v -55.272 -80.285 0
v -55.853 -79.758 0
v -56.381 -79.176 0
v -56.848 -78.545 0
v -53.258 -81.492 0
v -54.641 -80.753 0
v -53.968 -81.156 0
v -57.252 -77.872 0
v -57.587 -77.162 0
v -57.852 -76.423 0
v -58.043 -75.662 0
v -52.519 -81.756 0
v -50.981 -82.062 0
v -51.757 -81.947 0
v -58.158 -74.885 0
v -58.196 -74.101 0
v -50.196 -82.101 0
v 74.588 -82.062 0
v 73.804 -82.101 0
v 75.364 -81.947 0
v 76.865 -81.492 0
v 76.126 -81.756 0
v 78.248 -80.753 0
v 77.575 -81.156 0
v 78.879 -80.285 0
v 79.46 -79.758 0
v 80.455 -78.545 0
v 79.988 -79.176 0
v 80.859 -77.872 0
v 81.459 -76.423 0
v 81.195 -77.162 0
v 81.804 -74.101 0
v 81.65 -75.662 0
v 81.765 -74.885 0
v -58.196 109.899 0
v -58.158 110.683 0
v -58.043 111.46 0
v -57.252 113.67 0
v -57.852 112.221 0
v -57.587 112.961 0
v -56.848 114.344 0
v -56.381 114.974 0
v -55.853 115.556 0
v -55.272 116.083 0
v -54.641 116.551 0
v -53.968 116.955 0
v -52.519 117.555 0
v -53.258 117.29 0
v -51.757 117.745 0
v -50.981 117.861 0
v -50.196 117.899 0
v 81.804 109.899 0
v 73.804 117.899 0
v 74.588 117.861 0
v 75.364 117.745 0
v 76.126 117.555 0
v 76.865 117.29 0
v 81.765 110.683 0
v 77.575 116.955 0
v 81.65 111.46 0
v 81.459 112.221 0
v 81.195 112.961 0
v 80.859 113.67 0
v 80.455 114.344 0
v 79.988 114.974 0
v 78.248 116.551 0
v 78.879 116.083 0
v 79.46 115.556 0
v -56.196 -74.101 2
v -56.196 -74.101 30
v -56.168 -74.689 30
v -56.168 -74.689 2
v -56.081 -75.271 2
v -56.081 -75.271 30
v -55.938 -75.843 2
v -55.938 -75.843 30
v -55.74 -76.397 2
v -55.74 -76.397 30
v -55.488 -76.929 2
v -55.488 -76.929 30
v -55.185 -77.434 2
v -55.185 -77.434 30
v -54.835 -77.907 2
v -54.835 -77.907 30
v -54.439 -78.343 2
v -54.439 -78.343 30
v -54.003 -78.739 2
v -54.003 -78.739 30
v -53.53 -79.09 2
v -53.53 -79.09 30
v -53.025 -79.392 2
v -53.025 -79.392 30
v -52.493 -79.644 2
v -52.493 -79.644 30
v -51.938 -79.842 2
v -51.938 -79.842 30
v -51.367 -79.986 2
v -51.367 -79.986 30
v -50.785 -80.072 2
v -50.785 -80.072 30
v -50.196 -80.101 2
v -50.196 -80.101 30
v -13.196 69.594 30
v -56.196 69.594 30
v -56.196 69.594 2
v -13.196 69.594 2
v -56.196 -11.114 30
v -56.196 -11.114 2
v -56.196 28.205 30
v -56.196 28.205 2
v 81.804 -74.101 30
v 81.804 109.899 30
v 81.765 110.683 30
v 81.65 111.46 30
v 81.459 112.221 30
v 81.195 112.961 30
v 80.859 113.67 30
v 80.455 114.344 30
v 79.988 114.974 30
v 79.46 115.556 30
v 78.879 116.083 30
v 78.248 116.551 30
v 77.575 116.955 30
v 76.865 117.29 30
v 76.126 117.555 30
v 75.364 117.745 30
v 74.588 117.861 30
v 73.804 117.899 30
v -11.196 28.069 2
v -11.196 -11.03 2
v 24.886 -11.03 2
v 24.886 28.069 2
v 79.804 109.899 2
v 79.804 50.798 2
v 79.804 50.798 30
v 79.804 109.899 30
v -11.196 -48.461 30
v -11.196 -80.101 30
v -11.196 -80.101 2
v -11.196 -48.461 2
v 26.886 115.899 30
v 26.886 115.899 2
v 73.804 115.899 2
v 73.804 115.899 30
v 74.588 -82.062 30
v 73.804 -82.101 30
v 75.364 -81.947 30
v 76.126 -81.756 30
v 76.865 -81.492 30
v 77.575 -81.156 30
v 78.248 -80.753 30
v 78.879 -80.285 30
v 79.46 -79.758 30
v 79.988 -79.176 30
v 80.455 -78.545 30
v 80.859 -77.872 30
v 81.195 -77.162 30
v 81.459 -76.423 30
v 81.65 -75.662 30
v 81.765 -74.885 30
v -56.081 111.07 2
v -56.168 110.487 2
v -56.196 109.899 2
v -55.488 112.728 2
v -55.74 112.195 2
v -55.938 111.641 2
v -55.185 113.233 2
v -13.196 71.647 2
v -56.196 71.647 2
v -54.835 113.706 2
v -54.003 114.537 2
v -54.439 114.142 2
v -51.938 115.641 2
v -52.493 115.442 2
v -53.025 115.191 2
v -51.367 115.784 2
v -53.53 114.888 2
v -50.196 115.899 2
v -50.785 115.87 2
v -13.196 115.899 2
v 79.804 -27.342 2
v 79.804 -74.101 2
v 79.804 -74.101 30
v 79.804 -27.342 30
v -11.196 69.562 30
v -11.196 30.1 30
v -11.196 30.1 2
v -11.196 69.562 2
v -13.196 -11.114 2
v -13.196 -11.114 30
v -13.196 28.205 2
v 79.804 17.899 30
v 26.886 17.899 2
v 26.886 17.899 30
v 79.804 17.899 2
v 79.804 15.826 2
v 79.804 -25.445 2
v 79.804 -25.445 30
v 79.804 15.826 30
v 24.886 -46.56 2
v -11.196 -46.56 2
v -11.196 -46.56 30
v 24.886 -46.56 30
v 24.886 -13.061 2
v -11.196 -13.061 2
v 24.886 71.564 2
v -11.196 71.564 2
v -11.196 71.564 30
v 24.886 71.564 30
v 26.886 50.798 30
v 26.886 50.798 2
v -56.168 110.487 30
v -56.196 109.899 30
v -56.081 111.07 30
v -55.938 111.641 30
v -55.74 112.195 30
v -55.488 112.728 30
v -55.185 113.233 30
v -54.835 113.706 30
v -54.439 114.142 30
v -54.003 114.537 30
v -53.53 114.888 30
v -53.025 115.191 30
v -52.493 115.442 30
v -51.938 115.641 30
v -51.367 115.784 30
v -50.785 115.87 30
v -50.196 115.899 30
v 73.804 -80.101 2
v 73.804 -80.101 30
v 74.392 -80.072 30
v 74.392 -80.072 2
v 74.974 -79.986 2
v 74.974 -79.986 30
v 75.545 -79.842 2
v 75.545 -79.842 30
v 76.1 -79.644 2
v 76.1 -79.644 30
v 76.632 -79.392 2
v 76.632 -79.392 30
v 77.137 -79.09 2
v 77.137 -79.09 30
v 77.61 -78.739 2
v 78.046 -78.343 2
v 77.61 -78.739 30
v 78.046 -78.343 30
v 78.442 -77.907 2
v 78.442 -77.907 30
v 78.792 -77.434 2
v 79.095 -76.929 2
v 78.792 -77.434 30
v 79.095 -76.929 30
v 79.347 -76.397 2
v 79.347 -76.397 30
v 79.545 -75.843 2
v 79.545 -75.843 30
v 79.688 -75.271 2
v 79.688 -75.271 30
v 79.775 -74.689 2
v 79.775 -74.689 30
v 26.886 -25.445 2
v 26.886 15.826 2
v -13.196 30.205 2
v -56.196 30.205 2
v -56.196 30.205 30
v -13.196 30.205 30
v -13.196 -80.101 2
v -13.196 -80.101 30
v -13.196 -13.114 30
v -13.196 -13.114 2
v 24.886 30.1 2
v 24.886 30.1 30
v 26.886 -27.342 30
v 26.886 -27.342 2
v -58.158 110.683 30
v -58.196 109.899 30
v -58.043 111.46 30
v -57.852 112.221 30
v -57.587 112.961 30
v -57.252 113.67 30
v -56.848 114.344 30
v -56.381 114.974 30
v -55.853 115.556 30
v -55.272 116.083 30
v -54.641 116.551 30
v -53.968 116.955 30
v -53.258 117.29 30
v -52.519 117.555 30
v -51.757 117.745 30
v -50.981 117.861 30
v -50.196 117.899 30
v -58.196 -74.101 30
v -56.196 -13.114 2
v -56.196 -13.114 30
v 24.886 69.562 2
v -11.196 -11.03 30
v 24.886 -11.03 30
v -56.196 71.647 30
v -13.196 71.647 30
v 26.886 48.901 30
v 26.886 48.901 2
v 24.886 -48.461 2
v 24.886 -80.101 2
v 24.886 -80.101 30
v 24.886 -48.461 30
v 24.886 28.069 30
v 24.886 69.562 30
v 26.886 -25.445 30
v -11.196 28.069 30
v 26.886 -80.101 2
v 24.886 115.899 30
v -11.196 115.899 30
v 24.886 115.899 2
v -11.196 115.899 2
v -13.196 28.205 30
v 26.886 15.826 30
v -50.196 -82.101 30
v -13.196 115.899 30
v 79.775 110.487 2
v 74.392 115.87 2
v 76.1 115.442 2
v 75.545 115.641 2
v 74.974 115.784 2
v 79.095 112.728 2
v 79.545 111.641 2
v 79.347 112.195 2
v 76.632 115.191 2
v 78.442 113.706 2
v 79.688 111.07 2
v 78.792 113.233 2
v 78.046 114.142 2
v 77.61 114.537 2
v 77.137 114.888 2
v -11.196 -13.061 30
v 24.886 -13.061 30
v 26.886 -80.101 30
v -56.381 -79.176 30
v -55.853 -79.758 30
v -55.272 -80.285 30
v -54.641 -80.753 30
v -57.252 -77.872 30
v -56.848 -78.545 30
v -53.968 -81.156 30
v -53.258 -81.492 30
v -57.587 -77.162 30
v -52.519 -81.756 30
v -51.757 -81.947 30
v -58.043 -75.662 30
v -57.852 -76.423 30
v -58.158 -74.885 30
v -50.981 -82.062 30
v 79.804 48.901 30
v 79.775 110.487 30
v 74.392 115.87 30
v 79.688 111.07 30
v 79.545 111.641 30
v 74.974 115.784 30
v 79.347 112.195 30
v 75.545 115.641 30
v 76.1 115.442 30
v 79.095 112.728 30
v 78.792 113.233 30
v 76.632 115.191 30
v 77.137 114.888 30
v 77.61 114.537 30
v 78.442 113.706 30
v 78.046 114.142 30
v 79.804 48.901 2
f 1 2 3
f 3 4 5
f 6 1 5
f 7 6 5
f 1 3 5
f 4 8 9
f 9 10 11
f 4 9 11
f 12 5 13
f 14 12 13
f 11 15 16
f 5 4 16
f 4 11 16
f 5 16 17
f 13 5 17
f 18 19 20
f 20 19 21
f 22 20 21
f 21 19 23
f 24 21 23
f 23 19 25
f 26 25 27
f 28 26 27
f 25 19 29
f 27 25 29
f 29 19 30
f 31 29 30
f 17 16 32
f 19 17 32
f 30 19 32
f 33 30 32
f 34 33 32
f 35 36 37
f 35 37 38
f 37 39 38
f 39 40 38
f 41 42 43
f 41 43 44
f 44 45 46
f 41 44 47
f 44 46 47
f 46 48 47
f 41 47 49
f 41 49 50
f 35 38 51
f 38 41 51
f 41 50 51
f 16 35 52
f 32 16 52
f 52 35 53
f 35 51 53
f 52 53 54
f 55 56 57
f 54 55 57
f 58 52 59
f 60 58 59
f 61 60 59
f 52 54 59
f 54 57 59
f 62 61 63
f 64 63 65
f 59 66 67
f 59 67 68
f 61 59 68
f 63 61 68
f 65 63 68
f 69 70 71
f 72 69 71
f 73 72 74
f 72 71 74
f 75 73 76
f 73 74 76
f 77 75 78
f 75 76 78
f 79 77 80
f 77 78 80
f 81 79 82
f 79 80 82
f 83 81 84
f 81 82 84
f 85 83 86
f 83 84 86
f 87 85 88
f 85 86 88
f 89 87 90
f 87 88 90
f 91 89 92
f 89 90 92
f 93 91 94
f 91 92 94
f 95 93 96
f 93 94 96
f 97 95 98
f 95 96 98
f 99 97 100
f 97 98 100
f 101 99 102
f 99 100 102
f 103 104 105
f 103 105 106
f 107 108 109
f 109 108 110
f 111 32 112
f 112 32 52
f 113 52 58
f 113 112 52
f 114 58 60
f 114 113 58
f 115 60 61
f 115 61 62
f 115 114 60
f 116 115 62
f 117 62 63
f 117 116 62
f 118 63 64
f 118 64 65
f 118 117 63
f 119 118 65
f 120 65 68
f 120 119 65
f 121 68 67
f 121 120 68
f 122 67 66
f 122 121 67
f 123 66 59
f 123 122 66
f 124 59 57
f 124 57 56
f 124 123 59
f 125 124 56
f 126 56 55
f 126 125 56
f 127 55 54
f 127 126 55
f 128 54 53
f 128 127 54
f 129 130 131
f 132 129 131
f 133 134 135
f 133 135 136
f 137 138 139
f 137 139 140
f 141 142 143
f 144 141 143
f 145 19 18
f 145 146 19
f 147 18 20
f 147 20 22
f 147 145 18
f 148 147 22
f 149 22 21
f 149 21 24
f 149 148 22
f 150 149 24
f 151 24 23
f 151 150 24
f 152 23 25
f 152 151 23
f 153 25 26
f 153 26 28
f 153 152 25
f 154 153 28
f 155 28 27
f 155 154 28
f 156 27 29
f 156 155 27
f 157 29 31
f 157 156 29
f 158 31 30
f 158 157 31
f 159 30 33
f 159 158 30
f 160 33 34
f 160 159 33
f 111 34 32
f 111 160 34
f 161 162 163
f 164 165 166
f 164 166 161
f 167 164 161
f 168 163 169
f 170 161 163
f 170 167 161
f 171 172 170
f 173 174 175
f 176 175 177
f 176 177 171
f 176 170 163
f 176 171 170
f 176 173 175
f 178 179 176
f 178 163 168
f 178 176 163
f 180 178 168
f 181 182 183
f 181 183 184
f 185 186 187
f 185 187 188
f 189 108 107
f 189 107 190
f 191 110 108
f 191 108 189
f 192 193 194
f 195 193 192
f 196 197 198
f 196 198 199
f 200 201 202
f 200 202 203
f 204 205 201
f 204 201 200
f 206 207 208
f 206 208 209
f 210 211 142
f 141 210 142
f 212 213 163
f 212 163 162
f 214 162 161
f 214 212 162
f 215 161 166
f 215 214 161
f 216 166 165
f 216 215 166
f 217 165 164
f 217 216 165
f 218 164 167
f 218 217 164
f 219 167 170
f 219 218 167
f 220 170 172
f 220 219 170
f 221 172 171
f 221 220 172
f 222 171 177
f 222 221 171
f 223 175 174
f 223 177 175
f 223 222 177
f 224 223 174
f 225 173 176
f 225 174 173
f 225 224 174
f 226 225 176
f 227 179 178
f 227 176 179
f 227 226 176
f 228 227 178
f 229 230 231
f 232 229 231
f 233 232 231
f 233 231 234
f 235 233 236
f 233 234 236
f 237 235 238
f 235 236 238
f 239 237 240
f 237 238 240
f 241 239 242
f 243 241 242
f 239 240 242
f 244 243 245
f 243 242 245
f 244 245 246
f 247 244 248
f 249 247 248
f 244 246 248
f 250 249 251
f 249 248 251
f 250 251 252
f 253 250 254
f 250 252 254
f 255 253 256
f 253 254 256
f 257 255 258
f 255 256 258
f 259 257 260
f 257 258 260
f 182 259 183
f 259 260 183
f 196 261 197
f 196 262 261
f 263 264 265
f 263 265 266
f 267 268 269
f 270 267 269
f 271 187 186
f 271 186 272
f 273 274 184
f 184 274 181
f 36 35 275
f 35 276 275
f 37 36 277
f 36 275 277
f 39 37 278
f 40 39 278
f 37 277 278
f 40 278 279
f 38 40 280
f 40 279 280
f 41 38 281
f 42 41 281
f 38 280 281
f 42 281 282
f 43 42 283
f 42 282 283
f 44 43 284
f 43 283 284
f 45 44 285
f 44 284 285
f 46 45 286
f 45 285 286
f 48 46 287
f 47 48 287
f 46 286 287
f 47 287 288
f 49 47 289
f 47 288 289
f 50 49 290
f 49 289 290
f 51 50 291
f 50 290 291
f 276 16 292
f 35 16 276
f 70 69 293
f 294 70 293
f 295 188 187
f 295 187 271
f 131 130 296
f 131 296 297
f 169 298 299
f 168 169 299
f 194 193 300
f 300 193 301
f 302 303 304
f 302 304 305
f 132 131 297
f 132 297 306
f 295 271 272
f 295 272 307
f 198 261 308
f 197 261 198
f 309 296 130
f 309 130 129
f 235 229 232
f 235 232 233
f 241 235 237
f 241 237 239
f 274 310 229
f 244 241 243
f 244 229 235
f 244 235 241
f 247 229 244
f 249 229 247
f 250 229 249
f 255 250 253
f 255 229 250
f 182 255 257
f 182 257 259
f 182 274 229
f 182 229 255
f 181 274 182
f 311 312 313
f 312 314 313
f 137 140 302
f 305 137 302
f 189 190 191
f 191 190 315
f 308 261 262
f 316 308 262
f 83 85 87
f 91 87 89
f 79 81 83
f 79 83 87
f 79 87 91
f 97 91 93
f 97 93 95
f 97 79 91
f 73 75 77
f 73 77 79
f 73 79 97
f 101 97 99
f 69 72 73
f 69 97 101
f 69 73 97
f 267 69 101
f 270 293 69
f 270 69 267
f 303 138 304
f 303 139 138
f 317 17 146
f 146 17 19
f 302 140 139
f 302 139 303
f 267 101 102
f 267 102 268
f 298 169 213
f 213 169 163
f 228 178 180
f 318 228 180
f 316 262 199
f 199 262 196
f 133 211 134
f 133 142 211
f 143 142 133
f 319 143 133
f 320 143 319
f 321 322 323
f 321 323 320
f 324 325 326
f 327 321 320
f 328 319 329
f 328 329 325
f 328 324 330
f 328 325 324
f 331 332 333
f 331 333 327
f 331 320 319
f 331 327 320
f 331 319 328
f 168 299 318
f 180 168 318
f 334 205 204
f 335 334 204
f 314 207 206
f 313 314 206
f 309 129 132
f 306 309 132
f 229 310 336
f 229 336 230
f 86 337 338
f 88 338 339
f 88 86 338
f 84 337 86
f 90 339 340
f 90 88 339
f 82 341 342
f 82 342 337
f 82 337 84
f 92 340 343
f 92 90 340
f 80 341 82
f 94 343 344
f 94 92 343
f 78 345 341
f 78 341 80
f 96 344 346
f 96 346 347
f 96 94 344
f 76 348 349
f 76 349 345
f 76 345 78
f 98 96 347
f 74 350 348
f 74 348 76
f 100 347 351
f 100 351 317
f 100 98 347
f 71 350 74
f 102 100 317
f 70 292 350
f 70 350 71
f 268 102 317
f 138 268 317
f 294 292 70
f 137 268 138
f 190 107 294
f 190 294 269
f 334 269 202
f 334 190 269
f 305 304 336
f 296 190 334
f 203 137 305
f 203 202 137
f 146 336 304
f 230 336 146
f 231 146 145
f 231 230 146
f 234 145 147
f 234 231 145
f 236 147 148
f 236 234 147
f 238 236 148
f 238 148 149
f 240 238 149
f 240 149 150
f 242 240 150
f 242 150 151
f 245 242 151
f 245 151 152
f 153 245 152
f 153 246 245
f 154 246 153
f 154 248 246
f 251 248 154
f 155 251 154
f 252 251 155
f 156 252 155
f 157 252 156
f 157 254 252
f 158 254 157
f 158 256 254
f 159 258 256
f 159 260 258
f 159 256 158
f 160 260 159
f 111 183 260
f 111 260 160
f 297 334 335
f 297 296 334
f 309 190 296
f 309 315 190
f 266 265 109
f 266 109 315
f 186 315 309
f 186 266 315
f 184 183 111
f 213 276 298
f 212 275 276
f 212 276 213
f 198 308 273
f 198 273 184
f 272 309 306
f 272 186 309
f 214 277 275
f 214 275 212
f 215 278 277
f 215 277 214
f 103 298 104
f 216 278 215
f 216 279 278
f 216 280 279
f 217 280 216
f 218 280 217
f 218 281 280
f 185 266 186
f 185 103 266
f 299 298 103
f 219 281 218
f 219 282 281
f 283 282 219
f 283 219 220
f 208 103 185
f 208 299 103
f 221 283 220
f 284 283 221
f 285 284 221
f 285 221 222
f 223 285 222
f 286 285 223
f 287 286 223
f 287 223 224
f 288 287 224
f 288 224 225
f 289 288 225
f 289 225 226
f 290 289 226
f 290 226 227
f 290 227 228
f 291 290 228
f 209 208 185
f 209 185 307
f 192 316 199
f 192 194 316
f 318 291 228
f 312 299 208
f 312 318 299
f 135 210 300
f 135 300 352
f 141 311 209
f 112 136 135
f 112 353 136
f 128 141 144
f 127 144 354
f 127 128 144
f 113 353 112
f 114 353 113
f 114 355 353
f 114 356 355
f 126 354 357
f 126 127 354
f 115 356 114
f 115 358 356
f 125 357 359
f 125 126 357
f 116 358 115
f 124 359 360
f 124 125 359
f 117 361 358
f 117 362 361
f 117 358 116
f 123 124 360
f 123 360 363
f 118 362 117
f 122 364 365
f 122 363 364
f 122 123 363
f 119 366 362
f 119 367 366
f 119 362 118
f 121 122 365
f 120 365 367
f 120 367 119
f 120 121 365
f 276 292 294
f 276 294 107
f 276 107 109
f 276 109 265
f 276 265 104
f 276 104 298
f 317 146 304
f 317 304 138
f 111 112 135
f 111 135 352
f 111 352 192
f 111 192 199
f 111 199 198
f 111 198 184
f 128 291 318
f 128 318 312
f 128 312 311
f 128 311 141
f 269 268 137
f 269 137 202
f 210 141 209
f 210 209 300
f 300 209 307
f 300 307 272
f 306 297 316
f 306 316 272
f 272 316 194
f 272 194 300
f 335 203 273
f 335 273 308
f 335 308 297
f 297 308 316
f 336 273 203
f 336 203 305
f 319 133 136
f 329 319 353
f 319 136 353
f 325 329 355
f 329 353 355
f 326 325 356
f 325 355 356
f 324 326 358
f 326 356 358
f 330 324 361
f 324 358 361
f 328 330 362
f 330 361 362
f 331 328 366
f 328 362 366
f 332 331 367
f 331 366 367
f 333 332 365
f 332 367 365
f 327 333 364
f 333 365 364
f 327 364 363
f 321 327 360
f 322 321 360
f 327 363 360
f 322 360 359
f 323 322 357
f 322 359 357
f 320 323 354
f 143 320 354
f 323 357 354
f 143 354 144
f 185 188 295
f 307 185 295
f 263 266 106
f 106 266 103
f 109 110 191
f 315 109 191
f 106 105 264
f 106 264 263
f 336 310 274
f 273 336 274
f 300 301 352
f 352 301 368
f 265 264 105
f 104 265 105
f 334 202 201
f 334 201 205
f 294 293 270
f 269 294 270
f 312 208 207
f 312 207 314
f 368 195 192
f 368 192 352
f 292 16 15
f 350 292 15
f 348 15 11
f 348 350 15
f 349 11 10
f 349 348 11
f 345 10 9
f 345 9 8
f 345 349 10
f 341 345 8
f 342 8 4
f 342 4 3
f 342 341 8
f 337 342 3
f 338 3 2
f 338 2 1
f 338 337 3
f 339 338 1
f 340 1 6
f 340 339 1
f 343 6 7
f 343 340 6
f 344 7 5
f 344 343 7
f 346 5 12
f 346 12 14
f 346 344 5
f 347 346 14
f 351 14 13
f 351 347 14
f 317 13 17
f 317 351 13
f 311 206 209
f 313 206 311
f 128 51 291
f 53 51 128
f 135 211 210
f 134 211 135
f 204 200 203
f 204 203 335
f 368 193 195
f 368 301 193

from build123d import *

# Parameters (mm, degrees)
SKETCH_W      = 140
SKETCH_H      = 200
PAD_DEPTH     = 30
FILLET_R      = 8
THICKNESS_T   = -2
SKETCH001_W   = 2
SKETCH001_H   = 196
SKETCH001_W_2 = 43
SKETCH001_H_2 = 2.053146
PAD001_DEPTH  = 28
SKETCH002_W   = 2
SKETCH002_H   = 196
SKETCH002_W_2 = 36.08274
SKETCH002_H_2 = 2.002022
SKETCH002_H_3 = 2.030933
SKETCH002_H_4 = 2.030928
SKETCH002_H_5 = 1.901375
SKETCH002_W_3 = 53.704103
SKETCH002_H_6 = 1.896915
SKETCH002_W_4 = 53
SKETCH002_H_7 = 2.073647
SKETCH002_W_5 = 52.91726
SKETCH002_H_8 = 1.89692
PAD002_DEPTH  = 10
PAD003_DEPTH  = 28
SKETCH003_W   = 43
SKETCH003_H   = 2
PAD004_DEPTH  = 30


with BuildPart() as part:
    # Sketch → Pad (new body)
    with BuildSketch(Plane.XY):
        with Locations((11.803558, 17.899191)):
            Rectangle(SKETCH_W, SKETCH_H)
    extrude(amount=PAD_DEPTH)

    # Fillet
    fillet_edges = [part.edges().sort_by_distance(p)[0] for p in [
        (-58.196442, -82.100809, 15),
        (81.803558, -82.100809, 15),
        (81.803558, 117.899191, 15),
        (-58.196442, 117.899191, 15),
    ]]
    fillet(fillet_edges, radius=FILLET_R)

    # Thickness
    thickness_openings = [part.faces().sort_by_distance(p)[0] for p in [
        (11.803558, 17.899191, 30),
    ]]
    offset(amount=THICKNESS_T, openings=thickness_openings)

    # Sketch001 (on Face10 of Thickness) → Pad001 (join)
    with BuildSketch(Plane.XY.offset(30)):
        with Locations((-12.196442, 17.899191)):
            Rectangle(SKETCH001_W, SKETCH001_H)
        with Locations((-34.696442, 70.620445)):
            Rectangle(SKETCH001_W_2, SKETCH001_H_2)
    extrude(amount=-PAD001_DEPTH)

    # Sketch002 (on Face23 of Pad001) → Pad002 (join)
    with BuildSketch(Plane.XY.offset(2)):
        with Locations((25.886298, 17.899191)):
            Rectangle(SKETCH002_W, SKETCH002_H)
        with Locations((6.844928, 70.562603)):
            Rectangle(SKETCH002_W_2, SKETCH002_H_2)
        with Locations((6.844928, 29.084188)):
            Rectangle(SKETCH002_W_2, SKETCH002_H_3)
        with Locations((6.844928, -12.045896)):
            Rectangle(SKETCH002_W_2, SKETCH002_H_4)
        with Locations((6.844928, -47.510318)):
            Rectangle(SKETCH002_W_2, SKETCH002_H_5)
        with Locations((53.738349, 49.849649)):
            Rectangle(SKETCH002_W_3, SKETCH002_H_6)
        with Locations((53.386298, 16.862367)):
            Rectangle(SKETCH002_W_4, SKETCH002_H_7)
        with Locations((53.344928, -26.393629)):
            Rectangle(SKETCH002_W_5, SKETCH002_H_8)
    extrude(amount=PAD002_DEPTH)

    # Sketch002 (on Face23 of Pad001) → Pad003 (join)
    with BuildSketch(Plane.XY.offset(2)):
        with Locations((25.886298, 17.899191)):
            Rectangle(SKETCH002_W, SKETCH002_H)
        with Locations((6.844928, 70.562603)):
            Rectangle(SKETCH002_W_2, SKETCH002_H_2)
        with Locations((6.844928, 29.084188)):
            Rectangle(SKETCH002_W_2, SKETCH002_H_3)
        with Locations((6.844928, -12.045896)):
            Rectangle(SKETCH002_W_2, SKETCH002_H_4)
        with Locations((6.844928, -47.510318)):
            Rectangle(SKETCH002_W_2, SKETCH002_H_5)
        with Locations((53.738349, 49.849649)):
            Rectangle(SKETCH002_W_3, SKETCH002_H_6)
        with Locations((53.386298, 16.862367)):
            Rectangle(SKETCH002_W_4, SKETCH002_H_7)
        with Locations((53.344928, -26.393629)):
            Rectangle(SKETCH002_W_5, SKETCH002_H_8)
    extrude(amount=PAD003_DEPTH)

    # Sketch003 → Pad004 (join)
    with BuildSketch(Plane.XY):
        with Locations((-34.696442, 29.20466)):
            Rectangle(SKETCH003_W, SKETCH003_H)
        with Locations((-34.696442, -12.11418)):
            Rectangle(SKETCH003_W, SKETCH003_H)
    extrude(amount=PAD004_DEPTH)


solid = part.part
